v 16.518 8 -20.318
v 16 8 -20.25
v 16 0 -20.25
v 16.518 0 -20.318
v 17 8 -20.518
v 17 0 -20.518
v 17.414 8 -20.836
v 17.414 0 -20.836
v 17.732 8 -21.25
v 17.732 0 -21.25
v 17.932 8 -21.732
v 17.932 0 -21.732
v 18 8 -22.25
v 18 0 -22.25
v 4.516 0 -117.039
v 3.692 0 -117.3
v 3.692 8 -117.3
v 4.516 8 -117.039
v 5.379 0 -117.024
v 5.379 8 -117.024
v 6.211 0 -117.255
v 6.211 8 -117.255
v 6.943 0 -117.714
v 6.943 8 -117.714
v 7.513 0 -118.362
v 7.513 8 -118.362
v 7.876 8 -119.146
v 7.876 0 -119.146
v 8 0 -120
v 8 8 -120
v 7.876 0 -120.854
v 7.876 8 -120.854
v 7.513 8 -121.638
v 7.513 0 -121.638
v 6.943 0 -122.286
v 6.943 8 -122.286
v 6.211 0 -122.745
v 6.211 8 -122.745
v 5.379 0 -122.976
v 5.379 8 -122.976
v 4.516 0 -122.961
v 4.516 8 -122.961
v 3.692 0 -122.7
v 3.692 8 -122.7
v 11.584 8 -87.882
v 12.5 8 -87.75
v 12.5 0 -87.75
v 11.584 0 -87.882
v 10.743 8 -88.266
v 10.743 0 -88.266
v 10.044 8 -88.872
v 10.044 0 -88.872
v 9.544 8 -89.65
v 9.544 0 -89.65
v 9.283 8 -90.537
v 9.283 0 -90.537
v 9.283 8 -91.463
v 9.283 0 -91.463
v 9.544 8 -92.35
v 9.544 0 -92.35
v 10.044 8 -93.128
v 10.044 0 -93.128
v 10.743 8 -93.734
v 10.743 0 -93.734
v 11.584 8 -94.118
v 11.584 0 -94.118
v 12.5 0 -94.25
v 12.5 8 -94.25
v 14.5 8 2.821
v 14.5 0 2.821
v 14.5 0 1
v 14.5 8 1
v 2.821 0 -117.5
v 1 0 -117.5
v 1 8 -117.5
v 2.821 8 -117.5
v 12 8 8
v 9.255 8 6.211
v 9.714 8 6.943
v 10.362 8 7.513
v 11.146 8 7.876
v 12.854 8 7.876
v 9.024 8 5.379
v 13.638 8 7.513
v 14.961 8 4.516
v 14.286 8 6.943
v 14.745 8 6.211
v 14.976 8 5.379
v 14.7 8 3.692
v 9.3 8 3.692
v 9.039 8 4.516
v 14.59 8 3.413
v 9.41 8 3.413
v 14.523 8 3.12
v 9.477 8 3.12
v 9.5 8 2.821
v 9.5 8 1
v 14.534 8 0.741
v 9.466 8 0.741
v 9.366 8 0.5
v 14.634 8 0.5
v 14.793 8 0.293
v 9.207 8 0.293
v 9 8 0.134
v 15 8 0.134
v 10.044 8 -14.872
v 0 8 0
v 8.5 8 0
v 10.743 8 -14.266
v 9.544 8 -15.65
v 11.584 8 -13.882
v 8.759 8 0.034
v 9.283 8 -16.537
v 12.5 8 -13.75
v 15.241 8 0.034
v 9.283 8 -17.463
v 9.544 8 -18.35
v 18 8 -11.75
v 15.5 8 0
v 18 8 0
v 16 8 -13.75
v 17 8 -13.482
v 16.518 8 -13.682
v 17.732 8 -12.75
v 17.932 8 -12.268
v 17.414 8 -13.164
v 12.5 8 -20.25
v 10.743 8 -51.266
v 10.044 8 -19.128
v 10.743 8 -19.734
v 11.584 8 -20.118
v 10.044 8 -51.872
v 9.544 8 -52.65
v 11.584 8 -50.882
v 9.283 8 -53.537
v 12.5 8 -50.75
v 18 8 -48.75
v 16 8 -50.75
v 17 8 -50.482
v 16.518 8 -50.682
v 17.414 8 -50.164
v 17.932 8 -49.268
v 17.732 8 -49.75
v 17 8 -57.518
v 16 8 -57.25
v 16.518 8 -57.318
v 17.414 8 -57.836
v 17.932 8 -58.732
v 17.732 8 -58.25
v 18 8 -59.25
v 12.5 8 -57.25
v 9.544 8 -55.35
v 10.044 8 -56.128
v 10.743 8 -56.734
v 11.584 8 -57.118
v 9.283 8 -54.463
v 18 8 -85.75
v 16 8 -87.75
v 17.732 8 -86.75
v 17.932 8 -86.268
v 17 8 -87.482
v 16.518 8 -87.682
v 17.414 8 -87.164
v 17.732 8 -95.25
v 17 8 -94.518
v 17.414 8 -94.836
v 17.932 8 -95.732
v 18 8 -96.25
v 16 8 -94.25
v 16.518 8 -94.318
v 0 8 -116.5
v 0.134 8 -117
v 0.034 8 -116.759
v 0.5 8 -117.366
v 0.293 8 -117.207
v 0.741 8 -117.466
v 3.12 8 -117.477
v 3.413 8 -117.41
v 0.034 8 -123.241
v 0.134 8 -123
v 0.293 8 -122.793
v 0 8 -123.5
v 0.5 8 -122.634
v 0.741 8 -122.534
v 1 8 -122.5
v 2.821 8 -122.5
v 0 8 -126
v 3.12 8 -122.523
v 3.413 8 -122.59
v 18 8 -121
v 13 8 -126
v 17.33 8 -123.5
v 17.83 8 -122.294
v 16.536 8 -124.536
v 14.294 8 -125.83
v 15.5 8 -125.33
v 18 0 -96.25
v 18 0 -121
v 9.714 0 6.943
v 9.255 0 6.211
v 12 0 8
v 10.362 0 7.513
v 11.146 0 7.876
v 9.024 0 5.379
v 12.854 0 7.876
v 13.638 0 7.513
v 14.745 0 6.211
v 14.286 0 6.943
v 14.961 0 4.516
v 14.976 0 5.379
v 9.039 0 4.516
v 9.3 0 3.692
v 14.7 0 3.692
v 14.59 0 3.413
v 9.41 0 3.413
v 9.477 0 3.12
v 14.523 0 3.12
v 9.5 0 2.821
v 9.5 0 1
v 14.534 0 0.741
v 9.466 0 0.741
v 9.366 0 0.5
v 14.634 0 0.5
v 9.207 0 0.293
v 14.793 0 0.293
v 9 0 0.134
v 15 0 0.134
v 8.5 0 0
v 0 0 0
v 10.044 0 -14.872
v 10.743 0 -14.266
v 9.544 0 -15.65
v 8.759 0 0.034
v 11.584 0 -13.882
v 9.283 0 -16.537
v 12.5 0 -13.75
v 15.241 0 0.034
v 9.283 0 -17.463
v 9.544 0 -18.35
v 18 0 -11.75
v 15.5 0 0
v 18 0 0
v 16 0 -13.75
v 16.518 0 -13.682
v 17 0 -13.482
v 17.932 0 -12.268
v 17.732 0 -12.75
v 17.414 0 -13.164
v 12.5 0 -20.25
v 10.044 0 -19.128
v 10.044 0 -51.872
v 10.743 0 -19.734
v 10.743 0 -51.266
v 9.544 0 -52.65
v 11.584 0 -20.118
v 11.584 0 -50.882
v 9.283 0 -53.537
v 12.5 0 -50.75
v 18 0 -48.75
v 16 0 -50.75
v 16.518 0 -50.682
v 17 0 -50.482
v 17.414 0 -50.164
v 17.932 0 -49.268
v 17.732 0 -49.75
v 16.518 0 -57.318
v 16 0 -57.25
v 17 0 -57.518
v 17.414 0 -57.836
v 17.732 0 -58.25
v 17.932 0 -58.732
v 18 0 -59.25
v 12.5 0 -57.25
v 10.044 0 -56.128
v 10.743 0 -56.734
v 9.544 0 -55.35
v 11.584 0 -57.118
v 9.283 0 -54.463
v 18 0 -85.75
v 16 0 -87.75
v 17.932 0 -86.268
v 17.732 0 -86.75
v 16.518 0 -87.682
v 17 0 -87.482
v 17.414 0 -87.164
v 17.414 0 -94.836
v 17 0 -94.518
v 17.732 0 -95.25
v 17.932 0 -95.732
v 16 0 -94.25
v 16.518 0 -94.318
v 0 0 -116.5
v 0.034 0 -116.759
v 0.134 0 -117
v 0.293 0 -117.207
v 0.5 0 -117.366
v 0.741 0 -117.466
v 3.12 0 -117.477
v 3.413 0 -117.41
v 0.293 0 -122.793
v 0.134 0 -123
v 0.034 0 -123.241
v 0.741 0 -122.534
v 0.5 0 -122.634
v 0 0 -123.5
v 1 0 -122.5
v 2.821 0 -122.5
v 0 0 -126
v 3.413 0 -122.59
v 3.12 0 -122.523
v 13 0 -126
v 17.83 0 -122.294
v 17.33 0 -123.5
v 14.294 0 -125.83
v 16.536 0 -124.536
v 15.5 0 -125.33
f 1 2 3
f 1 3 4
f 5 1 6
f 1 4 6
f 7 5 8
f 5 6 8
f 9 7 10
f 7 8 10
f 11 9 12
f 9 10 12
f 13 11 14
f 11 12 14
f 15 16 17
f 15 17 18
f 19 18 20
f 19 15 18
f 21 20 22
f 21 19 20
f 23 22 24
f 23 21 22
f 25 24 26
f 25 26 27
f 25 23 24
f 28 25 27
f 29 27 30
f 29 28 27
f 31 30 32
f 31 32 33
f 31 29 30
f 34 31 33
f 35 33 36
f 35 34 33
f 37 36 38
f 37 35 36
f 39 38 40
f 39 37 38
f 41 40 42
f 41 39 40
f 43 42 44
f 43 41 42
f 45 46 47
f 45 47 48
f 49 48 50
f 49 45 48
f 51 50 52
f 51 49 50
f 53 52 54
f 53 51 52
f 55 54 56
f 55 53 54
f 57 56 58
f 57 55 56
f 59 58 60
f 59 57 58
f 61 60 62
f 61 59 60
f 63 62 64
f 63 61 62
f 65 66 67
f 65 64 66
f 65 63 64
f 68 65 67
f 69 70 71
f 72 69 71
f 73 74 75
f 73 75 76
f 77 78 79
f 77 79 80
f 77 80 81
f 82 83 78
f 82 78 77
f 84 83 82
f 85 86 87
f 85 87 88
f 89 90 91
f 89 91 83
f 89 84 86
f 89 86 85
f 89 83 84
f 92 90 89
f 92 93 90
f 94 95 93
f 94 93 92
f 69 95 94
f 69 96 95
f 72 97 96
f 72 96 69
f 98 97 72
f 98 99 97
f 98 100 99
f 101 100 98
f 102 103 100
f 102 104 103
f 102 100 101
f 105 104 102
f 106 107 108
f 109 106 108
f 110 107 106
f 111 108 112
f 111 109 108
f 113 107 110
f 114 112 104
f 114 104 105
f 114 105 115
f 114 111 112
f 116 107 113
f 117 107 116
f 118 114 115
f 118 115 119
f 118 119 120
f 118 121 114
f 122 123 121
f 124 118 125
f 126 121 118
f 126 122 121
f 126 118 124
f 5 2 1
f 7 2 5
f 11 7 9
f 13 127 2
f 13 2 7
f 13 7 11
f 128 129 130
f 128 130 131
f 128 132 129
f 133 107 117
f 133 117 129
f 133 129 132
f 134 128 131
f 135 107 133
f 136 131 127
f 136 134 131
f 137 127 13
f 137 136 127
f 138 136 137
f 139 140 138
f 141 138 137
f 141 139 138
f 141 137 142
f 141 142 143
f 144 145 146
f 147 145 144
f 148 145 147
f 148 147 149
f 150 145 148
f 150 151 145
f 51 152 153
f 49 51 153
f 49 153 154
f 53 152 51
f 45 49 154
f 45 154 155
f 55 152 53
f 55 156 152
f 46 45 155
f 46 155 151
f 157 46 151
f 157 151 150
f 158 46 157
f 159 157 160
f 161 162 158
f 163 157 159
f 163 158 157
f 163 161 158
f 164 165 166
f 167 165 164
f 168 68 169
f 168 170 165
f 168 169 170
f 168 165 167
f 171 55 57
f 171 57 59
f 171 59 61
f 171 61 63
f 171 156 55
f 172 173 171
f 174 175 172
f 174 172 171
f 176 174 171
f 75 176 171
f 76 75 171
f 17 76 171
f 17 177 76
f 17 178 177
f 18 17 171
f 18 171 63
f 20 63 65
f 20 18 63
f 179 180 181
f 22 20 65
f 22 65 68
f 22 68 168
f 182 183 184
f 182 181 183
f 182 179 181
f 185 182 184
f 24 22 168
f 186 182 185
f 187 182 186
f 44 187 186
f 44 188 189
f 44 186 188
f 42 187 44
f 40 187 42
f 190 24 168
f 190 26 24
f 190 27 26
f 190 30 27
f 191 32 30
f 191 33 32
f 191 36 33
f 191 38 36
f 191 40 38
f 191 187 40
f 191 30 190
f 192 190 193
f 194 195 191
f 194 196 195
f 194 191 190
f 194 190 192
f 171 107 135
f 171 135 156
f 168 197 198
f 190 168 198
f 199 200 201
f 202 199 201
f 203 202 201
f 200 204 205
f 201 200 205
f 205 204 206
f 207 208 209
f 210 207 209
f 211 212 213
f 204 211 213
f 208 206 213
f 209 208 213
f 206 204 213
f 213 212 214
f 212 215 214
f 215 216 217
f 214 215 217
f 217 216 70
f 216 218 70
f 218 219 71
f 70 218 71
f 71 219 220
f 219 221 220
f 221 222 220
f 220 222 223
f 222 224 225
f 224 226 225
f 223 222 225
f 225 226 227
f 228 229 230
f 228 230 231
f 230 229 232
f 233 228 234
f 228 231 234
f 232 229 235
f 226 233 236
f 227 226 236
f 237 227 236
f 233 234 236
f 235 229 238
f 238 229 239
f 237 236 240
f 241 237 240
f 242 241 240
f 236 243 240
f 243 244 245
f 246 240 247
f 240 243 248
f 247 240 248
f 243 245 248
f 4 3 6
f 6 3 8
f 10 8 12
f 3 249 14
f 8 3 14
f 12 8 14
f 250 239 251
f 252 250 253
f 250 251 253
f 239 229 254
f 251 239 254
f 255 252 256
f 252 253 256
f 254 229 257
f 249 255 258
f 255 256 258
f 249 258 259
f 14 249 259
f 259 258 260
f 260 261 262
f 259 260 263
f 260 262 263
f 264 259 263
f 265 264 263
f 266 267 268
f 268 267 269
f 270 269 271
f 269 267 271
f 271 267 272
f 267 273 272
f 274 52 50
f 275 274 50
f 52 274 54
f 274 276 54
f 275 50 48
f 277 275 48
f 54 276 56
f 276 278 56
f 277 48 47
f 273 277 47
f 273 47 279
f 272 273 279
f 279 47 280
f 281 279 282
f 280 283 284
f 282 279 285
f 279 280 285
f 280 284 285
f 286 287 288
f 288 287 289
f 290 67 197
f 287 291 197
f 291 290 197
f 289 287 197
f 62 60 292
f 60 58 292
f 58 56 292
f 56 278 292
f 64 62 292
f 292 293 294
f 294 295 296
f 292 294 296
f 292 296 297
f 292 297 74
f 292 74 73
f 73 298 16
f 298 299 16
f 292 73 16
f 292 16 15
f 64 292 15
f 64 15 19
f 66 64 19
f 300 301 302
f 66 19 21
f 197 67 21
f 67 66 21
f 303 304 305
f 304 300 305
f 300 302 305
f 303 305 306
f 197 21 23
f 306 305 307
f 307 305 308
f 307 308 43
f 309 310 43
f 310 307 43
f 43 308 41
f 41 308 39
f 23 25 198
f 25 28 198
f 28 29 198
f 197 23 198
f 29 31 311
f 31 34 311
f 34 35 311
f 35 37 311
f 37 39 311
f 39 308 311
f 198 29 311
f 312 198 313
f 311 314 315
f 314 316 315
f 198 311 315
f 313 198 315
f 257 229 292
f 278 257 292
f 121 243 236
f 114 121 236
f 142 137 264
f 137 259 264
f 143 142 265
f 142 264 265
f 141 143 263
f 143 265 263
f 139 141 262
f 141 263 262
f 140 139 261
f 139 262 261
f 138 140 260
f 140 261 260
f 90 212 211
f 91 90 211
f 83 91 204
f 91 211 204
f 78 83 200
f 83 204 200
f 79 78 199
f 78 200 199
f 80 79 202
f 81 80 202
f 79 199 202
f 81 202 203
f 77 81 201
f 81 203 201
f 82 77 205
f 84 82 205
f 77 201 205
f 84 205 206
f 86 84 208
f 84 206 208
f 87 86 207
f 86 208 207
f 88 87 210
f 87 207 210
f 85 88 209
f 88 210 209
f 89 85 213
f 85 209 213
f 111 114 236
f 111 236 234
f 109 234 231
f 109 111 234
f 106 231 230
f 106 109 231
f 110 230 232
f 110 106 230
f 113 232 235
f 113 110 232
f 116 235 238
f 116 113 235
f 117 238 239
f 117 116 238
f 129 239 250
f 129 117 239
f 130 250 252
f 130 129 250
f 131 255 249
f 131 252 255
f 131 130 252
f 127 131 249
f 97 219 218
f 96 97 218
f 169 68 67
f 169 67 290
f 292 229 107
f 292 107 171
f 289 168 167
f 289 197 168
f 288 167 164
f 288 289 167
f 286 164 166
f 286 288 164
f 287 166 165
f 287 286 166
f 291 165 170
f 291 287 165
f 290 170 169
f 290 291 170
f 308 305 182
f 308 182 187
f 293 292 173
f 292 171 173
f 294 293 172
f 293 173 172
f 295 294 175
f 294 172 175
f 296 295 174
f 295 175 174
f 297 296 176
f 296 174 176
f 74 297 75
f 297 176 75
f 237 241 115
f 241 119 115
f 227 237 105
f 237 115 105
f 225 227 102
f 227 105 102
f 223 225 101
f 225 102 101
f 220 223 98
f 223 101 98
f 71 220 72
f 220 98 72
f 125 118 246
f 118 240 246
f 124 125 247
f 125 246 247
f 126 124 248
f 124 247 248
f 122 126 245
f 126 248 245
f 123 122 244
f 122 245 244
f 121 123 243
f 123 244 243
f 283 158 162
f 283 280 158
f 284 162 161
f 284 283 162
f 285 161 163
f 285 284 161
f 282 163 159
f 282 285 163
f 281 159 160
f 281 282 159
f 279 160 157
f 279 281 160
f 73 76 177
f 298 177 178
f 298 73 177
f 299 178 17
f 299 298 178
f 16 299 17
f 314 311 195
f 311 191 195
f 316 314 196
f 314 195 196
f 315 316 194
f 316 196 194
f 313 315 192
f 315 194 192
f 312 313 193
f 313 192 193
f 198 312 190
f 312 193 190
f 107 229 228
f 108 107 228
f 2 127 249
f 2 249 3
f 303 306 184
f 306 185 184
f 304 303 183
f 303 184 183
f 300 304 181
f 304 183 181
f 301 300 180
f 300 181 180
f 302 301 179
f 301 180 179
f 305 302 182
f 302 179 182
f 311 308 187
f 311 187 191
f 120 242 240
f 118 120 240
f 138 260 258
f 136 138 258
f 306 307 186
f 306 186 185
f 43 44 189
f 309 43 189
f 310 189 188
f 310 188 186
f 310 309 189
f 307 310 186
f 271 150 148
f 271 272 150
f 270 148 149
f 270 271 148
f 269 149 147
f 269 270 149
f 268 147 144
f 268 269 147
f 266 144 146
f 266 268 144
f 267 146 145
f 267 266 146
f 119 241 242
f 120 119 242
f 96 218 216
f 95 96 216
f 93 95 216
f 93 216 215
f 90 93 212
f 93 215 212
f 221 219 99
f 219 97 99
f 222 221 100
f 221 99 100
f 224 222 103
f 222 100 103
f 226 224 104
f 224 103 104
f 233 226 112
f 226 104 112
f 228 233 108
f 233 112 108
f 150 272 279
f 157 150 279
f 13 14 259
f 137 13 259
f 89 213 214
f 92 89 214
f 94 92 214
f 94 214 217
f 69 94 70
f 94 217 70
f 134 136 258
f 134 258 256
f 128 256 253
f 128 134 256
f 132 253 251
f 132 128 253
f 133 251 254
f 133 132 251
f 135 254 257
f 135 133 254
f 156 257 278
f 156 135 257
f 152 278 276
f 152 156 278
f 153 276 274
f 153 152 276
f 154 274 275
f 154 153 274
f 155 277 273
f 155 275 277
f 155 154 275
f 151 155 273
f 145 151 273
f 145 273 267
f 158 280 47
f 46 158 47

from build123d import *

# Parameters (mm, degrees)
SKETCH_1_W          = 18
SKETCH_1_H          = 126
EXTRUDE_1_DEPTH     = 8
CUT_EXTRUDE_1_DEPTH = 10
FILLET_1_R          = 5
FILLET_2_R          = 2
EXTRUDE_5_DEPTH     = 8
CUT_EXTRUDE_4_DEPTH = 8
FILLET_3_R          = 1
FILLET_4_R          = 1


with BuildPart() as part:
    # 스케치1 → 보스-돌출1 (new body)
    with BuildSketch(Plane(origin=(0, 0, 0), x_dir=(1, 0, 0), z_dir=(0, 1, 0))):
        with Locations((9, 63)):
            Rectangle(SKETCH_1_W, SKETCH_1_H)
    extrude(amount=EXTRUDE_1_DEPTH)

    # 스케치2 → 컷-돌출1 (cut)
    with BuildSketch(Plane(origin=(0, 8, 0), x_dir=(1, 0, 0), z_dir=(0, 1, 0))):
        with BuildLine():
            Line((12.5, 94.25), (18, 94.25))
            ThreePointArc((18, 94.25), (21.25, 91), (18, 87.75))
            Line((18, 87.75), (12.5, 87.75))
            ThreePointArc((12.5, 87.75), (9.25, 91), (12.5, 94.25))
        make_face()
        with BuildLine():
            Line((12.5, 57.25), (18, 57.25))
            ThreePointArc((18, 57.25), (21.25, 54), (18, 50.75))
            Line((18, 50.75), (12.5, 50.75))
            ThreePointArc((12.5, 50.75), (9.25, 54), (12.5, 57.25))
        make_face()
        with BuildLine():
            Line((12.5, 20.25), (18, 20.25))
            ThreePointArc((18, 20.25), (21.25, 17), (18, 13.75))
            Line((18, 13.75), (12.5, 13.75))
            ThreePointArc((12.5, 13.75), (9.25, 17), (12.5, 20.25))
        make_face()
    extrude(amount=-CUT_EXTRUDE_1_DEPTH, mode=Mode.SUBTRACT)

    # 필렛1
    fillet_1_edges = [part.edges().sort_by_distance(p)[0] for p in [
        (18, 4, -126),
    ]]
    fillet(fillet_1_edges, radius=FILLET_1_R)

    # 필렛2
    fillet_2_edges = [part.edges().sort_by_distance(p)[0] for p in [
        (18, 4, -94.25),
        (18, 4, -87.75),
        (18, 4, -57.25),
        (18, 4, -50.75),
        (18, 4, -20.25),
        (18, 4, -13.75),
    ]]
    fillet(fillet_2_edges, radius=FILLET_2_R)

    # 스케치10 → 보스-돌출5 (add)
    with BuildSketch(Plane.XZ):
        with BuildLine():
            Line((9.5, 0), (9.5, 2.820550528))
            ThreePointArc((9.5, 2.820550528), (9.449358869, 3.267764124), (9.3, 3.692330317))
            ThreePointArc((9.3, 3.692330317), (12, 8), (14.7, 3.692330317))
            ThreePointArc((14.7, 3.692330317), (14.550641131, 3.267764124), (14.5, 2.820550528))
            Line((14.5, 2.820550528), (14.5, 0))
            Line((14.5, 0), (9.5, 0))
        make_face()
    extrude(amount=-EXTRUDE_5_DEPTH)

    # 스케치11 → 컷-돌출4 (cut)
    with BuildSketch(Plane.XZ):
        with BuildLine():
            Line((0, -117.5), (2.820550528, -117.5))
            ThreePointArc((2.820550528, -117.5), (3.267764124, -117.449358869), (3.692330317, -117.3))
            ThreePointArc((3.692330317, -117.3), (8, -120), (3.692330317, -122.7))
            ThreePointArc((3.692330317, -122.7), (3.267764124, -122.550641131), (2.820550528, -122.5))
            Line((2.820550528, -122.5), (0, -122.5))
            Line((0, -122.5), (0, -117.5))
        make_face()
    extrude(amount=-CUT_EXTRUDE_4_DEPTH, mode=Mode.SUBTRACT)

    # 필렛3
    fillet_3_edges = [part.edges().sort_by_distance(p)[0] for p in [
        (9.5, 4, 0),
        (14.5, 4, 0),
    ]]
    fillet(fillet_3_edges, radius=FILLET_3_R)

    # 필렛4
    fillet_4_edges = [part.edges().sort_by_distance(p)[0] for p in [
        (0, 4, -122.5),
        (0, 4, -117.5),
    ]]
    fillet(fillet_4_edges, radius=FILLET_4_R)


solid = part.part
